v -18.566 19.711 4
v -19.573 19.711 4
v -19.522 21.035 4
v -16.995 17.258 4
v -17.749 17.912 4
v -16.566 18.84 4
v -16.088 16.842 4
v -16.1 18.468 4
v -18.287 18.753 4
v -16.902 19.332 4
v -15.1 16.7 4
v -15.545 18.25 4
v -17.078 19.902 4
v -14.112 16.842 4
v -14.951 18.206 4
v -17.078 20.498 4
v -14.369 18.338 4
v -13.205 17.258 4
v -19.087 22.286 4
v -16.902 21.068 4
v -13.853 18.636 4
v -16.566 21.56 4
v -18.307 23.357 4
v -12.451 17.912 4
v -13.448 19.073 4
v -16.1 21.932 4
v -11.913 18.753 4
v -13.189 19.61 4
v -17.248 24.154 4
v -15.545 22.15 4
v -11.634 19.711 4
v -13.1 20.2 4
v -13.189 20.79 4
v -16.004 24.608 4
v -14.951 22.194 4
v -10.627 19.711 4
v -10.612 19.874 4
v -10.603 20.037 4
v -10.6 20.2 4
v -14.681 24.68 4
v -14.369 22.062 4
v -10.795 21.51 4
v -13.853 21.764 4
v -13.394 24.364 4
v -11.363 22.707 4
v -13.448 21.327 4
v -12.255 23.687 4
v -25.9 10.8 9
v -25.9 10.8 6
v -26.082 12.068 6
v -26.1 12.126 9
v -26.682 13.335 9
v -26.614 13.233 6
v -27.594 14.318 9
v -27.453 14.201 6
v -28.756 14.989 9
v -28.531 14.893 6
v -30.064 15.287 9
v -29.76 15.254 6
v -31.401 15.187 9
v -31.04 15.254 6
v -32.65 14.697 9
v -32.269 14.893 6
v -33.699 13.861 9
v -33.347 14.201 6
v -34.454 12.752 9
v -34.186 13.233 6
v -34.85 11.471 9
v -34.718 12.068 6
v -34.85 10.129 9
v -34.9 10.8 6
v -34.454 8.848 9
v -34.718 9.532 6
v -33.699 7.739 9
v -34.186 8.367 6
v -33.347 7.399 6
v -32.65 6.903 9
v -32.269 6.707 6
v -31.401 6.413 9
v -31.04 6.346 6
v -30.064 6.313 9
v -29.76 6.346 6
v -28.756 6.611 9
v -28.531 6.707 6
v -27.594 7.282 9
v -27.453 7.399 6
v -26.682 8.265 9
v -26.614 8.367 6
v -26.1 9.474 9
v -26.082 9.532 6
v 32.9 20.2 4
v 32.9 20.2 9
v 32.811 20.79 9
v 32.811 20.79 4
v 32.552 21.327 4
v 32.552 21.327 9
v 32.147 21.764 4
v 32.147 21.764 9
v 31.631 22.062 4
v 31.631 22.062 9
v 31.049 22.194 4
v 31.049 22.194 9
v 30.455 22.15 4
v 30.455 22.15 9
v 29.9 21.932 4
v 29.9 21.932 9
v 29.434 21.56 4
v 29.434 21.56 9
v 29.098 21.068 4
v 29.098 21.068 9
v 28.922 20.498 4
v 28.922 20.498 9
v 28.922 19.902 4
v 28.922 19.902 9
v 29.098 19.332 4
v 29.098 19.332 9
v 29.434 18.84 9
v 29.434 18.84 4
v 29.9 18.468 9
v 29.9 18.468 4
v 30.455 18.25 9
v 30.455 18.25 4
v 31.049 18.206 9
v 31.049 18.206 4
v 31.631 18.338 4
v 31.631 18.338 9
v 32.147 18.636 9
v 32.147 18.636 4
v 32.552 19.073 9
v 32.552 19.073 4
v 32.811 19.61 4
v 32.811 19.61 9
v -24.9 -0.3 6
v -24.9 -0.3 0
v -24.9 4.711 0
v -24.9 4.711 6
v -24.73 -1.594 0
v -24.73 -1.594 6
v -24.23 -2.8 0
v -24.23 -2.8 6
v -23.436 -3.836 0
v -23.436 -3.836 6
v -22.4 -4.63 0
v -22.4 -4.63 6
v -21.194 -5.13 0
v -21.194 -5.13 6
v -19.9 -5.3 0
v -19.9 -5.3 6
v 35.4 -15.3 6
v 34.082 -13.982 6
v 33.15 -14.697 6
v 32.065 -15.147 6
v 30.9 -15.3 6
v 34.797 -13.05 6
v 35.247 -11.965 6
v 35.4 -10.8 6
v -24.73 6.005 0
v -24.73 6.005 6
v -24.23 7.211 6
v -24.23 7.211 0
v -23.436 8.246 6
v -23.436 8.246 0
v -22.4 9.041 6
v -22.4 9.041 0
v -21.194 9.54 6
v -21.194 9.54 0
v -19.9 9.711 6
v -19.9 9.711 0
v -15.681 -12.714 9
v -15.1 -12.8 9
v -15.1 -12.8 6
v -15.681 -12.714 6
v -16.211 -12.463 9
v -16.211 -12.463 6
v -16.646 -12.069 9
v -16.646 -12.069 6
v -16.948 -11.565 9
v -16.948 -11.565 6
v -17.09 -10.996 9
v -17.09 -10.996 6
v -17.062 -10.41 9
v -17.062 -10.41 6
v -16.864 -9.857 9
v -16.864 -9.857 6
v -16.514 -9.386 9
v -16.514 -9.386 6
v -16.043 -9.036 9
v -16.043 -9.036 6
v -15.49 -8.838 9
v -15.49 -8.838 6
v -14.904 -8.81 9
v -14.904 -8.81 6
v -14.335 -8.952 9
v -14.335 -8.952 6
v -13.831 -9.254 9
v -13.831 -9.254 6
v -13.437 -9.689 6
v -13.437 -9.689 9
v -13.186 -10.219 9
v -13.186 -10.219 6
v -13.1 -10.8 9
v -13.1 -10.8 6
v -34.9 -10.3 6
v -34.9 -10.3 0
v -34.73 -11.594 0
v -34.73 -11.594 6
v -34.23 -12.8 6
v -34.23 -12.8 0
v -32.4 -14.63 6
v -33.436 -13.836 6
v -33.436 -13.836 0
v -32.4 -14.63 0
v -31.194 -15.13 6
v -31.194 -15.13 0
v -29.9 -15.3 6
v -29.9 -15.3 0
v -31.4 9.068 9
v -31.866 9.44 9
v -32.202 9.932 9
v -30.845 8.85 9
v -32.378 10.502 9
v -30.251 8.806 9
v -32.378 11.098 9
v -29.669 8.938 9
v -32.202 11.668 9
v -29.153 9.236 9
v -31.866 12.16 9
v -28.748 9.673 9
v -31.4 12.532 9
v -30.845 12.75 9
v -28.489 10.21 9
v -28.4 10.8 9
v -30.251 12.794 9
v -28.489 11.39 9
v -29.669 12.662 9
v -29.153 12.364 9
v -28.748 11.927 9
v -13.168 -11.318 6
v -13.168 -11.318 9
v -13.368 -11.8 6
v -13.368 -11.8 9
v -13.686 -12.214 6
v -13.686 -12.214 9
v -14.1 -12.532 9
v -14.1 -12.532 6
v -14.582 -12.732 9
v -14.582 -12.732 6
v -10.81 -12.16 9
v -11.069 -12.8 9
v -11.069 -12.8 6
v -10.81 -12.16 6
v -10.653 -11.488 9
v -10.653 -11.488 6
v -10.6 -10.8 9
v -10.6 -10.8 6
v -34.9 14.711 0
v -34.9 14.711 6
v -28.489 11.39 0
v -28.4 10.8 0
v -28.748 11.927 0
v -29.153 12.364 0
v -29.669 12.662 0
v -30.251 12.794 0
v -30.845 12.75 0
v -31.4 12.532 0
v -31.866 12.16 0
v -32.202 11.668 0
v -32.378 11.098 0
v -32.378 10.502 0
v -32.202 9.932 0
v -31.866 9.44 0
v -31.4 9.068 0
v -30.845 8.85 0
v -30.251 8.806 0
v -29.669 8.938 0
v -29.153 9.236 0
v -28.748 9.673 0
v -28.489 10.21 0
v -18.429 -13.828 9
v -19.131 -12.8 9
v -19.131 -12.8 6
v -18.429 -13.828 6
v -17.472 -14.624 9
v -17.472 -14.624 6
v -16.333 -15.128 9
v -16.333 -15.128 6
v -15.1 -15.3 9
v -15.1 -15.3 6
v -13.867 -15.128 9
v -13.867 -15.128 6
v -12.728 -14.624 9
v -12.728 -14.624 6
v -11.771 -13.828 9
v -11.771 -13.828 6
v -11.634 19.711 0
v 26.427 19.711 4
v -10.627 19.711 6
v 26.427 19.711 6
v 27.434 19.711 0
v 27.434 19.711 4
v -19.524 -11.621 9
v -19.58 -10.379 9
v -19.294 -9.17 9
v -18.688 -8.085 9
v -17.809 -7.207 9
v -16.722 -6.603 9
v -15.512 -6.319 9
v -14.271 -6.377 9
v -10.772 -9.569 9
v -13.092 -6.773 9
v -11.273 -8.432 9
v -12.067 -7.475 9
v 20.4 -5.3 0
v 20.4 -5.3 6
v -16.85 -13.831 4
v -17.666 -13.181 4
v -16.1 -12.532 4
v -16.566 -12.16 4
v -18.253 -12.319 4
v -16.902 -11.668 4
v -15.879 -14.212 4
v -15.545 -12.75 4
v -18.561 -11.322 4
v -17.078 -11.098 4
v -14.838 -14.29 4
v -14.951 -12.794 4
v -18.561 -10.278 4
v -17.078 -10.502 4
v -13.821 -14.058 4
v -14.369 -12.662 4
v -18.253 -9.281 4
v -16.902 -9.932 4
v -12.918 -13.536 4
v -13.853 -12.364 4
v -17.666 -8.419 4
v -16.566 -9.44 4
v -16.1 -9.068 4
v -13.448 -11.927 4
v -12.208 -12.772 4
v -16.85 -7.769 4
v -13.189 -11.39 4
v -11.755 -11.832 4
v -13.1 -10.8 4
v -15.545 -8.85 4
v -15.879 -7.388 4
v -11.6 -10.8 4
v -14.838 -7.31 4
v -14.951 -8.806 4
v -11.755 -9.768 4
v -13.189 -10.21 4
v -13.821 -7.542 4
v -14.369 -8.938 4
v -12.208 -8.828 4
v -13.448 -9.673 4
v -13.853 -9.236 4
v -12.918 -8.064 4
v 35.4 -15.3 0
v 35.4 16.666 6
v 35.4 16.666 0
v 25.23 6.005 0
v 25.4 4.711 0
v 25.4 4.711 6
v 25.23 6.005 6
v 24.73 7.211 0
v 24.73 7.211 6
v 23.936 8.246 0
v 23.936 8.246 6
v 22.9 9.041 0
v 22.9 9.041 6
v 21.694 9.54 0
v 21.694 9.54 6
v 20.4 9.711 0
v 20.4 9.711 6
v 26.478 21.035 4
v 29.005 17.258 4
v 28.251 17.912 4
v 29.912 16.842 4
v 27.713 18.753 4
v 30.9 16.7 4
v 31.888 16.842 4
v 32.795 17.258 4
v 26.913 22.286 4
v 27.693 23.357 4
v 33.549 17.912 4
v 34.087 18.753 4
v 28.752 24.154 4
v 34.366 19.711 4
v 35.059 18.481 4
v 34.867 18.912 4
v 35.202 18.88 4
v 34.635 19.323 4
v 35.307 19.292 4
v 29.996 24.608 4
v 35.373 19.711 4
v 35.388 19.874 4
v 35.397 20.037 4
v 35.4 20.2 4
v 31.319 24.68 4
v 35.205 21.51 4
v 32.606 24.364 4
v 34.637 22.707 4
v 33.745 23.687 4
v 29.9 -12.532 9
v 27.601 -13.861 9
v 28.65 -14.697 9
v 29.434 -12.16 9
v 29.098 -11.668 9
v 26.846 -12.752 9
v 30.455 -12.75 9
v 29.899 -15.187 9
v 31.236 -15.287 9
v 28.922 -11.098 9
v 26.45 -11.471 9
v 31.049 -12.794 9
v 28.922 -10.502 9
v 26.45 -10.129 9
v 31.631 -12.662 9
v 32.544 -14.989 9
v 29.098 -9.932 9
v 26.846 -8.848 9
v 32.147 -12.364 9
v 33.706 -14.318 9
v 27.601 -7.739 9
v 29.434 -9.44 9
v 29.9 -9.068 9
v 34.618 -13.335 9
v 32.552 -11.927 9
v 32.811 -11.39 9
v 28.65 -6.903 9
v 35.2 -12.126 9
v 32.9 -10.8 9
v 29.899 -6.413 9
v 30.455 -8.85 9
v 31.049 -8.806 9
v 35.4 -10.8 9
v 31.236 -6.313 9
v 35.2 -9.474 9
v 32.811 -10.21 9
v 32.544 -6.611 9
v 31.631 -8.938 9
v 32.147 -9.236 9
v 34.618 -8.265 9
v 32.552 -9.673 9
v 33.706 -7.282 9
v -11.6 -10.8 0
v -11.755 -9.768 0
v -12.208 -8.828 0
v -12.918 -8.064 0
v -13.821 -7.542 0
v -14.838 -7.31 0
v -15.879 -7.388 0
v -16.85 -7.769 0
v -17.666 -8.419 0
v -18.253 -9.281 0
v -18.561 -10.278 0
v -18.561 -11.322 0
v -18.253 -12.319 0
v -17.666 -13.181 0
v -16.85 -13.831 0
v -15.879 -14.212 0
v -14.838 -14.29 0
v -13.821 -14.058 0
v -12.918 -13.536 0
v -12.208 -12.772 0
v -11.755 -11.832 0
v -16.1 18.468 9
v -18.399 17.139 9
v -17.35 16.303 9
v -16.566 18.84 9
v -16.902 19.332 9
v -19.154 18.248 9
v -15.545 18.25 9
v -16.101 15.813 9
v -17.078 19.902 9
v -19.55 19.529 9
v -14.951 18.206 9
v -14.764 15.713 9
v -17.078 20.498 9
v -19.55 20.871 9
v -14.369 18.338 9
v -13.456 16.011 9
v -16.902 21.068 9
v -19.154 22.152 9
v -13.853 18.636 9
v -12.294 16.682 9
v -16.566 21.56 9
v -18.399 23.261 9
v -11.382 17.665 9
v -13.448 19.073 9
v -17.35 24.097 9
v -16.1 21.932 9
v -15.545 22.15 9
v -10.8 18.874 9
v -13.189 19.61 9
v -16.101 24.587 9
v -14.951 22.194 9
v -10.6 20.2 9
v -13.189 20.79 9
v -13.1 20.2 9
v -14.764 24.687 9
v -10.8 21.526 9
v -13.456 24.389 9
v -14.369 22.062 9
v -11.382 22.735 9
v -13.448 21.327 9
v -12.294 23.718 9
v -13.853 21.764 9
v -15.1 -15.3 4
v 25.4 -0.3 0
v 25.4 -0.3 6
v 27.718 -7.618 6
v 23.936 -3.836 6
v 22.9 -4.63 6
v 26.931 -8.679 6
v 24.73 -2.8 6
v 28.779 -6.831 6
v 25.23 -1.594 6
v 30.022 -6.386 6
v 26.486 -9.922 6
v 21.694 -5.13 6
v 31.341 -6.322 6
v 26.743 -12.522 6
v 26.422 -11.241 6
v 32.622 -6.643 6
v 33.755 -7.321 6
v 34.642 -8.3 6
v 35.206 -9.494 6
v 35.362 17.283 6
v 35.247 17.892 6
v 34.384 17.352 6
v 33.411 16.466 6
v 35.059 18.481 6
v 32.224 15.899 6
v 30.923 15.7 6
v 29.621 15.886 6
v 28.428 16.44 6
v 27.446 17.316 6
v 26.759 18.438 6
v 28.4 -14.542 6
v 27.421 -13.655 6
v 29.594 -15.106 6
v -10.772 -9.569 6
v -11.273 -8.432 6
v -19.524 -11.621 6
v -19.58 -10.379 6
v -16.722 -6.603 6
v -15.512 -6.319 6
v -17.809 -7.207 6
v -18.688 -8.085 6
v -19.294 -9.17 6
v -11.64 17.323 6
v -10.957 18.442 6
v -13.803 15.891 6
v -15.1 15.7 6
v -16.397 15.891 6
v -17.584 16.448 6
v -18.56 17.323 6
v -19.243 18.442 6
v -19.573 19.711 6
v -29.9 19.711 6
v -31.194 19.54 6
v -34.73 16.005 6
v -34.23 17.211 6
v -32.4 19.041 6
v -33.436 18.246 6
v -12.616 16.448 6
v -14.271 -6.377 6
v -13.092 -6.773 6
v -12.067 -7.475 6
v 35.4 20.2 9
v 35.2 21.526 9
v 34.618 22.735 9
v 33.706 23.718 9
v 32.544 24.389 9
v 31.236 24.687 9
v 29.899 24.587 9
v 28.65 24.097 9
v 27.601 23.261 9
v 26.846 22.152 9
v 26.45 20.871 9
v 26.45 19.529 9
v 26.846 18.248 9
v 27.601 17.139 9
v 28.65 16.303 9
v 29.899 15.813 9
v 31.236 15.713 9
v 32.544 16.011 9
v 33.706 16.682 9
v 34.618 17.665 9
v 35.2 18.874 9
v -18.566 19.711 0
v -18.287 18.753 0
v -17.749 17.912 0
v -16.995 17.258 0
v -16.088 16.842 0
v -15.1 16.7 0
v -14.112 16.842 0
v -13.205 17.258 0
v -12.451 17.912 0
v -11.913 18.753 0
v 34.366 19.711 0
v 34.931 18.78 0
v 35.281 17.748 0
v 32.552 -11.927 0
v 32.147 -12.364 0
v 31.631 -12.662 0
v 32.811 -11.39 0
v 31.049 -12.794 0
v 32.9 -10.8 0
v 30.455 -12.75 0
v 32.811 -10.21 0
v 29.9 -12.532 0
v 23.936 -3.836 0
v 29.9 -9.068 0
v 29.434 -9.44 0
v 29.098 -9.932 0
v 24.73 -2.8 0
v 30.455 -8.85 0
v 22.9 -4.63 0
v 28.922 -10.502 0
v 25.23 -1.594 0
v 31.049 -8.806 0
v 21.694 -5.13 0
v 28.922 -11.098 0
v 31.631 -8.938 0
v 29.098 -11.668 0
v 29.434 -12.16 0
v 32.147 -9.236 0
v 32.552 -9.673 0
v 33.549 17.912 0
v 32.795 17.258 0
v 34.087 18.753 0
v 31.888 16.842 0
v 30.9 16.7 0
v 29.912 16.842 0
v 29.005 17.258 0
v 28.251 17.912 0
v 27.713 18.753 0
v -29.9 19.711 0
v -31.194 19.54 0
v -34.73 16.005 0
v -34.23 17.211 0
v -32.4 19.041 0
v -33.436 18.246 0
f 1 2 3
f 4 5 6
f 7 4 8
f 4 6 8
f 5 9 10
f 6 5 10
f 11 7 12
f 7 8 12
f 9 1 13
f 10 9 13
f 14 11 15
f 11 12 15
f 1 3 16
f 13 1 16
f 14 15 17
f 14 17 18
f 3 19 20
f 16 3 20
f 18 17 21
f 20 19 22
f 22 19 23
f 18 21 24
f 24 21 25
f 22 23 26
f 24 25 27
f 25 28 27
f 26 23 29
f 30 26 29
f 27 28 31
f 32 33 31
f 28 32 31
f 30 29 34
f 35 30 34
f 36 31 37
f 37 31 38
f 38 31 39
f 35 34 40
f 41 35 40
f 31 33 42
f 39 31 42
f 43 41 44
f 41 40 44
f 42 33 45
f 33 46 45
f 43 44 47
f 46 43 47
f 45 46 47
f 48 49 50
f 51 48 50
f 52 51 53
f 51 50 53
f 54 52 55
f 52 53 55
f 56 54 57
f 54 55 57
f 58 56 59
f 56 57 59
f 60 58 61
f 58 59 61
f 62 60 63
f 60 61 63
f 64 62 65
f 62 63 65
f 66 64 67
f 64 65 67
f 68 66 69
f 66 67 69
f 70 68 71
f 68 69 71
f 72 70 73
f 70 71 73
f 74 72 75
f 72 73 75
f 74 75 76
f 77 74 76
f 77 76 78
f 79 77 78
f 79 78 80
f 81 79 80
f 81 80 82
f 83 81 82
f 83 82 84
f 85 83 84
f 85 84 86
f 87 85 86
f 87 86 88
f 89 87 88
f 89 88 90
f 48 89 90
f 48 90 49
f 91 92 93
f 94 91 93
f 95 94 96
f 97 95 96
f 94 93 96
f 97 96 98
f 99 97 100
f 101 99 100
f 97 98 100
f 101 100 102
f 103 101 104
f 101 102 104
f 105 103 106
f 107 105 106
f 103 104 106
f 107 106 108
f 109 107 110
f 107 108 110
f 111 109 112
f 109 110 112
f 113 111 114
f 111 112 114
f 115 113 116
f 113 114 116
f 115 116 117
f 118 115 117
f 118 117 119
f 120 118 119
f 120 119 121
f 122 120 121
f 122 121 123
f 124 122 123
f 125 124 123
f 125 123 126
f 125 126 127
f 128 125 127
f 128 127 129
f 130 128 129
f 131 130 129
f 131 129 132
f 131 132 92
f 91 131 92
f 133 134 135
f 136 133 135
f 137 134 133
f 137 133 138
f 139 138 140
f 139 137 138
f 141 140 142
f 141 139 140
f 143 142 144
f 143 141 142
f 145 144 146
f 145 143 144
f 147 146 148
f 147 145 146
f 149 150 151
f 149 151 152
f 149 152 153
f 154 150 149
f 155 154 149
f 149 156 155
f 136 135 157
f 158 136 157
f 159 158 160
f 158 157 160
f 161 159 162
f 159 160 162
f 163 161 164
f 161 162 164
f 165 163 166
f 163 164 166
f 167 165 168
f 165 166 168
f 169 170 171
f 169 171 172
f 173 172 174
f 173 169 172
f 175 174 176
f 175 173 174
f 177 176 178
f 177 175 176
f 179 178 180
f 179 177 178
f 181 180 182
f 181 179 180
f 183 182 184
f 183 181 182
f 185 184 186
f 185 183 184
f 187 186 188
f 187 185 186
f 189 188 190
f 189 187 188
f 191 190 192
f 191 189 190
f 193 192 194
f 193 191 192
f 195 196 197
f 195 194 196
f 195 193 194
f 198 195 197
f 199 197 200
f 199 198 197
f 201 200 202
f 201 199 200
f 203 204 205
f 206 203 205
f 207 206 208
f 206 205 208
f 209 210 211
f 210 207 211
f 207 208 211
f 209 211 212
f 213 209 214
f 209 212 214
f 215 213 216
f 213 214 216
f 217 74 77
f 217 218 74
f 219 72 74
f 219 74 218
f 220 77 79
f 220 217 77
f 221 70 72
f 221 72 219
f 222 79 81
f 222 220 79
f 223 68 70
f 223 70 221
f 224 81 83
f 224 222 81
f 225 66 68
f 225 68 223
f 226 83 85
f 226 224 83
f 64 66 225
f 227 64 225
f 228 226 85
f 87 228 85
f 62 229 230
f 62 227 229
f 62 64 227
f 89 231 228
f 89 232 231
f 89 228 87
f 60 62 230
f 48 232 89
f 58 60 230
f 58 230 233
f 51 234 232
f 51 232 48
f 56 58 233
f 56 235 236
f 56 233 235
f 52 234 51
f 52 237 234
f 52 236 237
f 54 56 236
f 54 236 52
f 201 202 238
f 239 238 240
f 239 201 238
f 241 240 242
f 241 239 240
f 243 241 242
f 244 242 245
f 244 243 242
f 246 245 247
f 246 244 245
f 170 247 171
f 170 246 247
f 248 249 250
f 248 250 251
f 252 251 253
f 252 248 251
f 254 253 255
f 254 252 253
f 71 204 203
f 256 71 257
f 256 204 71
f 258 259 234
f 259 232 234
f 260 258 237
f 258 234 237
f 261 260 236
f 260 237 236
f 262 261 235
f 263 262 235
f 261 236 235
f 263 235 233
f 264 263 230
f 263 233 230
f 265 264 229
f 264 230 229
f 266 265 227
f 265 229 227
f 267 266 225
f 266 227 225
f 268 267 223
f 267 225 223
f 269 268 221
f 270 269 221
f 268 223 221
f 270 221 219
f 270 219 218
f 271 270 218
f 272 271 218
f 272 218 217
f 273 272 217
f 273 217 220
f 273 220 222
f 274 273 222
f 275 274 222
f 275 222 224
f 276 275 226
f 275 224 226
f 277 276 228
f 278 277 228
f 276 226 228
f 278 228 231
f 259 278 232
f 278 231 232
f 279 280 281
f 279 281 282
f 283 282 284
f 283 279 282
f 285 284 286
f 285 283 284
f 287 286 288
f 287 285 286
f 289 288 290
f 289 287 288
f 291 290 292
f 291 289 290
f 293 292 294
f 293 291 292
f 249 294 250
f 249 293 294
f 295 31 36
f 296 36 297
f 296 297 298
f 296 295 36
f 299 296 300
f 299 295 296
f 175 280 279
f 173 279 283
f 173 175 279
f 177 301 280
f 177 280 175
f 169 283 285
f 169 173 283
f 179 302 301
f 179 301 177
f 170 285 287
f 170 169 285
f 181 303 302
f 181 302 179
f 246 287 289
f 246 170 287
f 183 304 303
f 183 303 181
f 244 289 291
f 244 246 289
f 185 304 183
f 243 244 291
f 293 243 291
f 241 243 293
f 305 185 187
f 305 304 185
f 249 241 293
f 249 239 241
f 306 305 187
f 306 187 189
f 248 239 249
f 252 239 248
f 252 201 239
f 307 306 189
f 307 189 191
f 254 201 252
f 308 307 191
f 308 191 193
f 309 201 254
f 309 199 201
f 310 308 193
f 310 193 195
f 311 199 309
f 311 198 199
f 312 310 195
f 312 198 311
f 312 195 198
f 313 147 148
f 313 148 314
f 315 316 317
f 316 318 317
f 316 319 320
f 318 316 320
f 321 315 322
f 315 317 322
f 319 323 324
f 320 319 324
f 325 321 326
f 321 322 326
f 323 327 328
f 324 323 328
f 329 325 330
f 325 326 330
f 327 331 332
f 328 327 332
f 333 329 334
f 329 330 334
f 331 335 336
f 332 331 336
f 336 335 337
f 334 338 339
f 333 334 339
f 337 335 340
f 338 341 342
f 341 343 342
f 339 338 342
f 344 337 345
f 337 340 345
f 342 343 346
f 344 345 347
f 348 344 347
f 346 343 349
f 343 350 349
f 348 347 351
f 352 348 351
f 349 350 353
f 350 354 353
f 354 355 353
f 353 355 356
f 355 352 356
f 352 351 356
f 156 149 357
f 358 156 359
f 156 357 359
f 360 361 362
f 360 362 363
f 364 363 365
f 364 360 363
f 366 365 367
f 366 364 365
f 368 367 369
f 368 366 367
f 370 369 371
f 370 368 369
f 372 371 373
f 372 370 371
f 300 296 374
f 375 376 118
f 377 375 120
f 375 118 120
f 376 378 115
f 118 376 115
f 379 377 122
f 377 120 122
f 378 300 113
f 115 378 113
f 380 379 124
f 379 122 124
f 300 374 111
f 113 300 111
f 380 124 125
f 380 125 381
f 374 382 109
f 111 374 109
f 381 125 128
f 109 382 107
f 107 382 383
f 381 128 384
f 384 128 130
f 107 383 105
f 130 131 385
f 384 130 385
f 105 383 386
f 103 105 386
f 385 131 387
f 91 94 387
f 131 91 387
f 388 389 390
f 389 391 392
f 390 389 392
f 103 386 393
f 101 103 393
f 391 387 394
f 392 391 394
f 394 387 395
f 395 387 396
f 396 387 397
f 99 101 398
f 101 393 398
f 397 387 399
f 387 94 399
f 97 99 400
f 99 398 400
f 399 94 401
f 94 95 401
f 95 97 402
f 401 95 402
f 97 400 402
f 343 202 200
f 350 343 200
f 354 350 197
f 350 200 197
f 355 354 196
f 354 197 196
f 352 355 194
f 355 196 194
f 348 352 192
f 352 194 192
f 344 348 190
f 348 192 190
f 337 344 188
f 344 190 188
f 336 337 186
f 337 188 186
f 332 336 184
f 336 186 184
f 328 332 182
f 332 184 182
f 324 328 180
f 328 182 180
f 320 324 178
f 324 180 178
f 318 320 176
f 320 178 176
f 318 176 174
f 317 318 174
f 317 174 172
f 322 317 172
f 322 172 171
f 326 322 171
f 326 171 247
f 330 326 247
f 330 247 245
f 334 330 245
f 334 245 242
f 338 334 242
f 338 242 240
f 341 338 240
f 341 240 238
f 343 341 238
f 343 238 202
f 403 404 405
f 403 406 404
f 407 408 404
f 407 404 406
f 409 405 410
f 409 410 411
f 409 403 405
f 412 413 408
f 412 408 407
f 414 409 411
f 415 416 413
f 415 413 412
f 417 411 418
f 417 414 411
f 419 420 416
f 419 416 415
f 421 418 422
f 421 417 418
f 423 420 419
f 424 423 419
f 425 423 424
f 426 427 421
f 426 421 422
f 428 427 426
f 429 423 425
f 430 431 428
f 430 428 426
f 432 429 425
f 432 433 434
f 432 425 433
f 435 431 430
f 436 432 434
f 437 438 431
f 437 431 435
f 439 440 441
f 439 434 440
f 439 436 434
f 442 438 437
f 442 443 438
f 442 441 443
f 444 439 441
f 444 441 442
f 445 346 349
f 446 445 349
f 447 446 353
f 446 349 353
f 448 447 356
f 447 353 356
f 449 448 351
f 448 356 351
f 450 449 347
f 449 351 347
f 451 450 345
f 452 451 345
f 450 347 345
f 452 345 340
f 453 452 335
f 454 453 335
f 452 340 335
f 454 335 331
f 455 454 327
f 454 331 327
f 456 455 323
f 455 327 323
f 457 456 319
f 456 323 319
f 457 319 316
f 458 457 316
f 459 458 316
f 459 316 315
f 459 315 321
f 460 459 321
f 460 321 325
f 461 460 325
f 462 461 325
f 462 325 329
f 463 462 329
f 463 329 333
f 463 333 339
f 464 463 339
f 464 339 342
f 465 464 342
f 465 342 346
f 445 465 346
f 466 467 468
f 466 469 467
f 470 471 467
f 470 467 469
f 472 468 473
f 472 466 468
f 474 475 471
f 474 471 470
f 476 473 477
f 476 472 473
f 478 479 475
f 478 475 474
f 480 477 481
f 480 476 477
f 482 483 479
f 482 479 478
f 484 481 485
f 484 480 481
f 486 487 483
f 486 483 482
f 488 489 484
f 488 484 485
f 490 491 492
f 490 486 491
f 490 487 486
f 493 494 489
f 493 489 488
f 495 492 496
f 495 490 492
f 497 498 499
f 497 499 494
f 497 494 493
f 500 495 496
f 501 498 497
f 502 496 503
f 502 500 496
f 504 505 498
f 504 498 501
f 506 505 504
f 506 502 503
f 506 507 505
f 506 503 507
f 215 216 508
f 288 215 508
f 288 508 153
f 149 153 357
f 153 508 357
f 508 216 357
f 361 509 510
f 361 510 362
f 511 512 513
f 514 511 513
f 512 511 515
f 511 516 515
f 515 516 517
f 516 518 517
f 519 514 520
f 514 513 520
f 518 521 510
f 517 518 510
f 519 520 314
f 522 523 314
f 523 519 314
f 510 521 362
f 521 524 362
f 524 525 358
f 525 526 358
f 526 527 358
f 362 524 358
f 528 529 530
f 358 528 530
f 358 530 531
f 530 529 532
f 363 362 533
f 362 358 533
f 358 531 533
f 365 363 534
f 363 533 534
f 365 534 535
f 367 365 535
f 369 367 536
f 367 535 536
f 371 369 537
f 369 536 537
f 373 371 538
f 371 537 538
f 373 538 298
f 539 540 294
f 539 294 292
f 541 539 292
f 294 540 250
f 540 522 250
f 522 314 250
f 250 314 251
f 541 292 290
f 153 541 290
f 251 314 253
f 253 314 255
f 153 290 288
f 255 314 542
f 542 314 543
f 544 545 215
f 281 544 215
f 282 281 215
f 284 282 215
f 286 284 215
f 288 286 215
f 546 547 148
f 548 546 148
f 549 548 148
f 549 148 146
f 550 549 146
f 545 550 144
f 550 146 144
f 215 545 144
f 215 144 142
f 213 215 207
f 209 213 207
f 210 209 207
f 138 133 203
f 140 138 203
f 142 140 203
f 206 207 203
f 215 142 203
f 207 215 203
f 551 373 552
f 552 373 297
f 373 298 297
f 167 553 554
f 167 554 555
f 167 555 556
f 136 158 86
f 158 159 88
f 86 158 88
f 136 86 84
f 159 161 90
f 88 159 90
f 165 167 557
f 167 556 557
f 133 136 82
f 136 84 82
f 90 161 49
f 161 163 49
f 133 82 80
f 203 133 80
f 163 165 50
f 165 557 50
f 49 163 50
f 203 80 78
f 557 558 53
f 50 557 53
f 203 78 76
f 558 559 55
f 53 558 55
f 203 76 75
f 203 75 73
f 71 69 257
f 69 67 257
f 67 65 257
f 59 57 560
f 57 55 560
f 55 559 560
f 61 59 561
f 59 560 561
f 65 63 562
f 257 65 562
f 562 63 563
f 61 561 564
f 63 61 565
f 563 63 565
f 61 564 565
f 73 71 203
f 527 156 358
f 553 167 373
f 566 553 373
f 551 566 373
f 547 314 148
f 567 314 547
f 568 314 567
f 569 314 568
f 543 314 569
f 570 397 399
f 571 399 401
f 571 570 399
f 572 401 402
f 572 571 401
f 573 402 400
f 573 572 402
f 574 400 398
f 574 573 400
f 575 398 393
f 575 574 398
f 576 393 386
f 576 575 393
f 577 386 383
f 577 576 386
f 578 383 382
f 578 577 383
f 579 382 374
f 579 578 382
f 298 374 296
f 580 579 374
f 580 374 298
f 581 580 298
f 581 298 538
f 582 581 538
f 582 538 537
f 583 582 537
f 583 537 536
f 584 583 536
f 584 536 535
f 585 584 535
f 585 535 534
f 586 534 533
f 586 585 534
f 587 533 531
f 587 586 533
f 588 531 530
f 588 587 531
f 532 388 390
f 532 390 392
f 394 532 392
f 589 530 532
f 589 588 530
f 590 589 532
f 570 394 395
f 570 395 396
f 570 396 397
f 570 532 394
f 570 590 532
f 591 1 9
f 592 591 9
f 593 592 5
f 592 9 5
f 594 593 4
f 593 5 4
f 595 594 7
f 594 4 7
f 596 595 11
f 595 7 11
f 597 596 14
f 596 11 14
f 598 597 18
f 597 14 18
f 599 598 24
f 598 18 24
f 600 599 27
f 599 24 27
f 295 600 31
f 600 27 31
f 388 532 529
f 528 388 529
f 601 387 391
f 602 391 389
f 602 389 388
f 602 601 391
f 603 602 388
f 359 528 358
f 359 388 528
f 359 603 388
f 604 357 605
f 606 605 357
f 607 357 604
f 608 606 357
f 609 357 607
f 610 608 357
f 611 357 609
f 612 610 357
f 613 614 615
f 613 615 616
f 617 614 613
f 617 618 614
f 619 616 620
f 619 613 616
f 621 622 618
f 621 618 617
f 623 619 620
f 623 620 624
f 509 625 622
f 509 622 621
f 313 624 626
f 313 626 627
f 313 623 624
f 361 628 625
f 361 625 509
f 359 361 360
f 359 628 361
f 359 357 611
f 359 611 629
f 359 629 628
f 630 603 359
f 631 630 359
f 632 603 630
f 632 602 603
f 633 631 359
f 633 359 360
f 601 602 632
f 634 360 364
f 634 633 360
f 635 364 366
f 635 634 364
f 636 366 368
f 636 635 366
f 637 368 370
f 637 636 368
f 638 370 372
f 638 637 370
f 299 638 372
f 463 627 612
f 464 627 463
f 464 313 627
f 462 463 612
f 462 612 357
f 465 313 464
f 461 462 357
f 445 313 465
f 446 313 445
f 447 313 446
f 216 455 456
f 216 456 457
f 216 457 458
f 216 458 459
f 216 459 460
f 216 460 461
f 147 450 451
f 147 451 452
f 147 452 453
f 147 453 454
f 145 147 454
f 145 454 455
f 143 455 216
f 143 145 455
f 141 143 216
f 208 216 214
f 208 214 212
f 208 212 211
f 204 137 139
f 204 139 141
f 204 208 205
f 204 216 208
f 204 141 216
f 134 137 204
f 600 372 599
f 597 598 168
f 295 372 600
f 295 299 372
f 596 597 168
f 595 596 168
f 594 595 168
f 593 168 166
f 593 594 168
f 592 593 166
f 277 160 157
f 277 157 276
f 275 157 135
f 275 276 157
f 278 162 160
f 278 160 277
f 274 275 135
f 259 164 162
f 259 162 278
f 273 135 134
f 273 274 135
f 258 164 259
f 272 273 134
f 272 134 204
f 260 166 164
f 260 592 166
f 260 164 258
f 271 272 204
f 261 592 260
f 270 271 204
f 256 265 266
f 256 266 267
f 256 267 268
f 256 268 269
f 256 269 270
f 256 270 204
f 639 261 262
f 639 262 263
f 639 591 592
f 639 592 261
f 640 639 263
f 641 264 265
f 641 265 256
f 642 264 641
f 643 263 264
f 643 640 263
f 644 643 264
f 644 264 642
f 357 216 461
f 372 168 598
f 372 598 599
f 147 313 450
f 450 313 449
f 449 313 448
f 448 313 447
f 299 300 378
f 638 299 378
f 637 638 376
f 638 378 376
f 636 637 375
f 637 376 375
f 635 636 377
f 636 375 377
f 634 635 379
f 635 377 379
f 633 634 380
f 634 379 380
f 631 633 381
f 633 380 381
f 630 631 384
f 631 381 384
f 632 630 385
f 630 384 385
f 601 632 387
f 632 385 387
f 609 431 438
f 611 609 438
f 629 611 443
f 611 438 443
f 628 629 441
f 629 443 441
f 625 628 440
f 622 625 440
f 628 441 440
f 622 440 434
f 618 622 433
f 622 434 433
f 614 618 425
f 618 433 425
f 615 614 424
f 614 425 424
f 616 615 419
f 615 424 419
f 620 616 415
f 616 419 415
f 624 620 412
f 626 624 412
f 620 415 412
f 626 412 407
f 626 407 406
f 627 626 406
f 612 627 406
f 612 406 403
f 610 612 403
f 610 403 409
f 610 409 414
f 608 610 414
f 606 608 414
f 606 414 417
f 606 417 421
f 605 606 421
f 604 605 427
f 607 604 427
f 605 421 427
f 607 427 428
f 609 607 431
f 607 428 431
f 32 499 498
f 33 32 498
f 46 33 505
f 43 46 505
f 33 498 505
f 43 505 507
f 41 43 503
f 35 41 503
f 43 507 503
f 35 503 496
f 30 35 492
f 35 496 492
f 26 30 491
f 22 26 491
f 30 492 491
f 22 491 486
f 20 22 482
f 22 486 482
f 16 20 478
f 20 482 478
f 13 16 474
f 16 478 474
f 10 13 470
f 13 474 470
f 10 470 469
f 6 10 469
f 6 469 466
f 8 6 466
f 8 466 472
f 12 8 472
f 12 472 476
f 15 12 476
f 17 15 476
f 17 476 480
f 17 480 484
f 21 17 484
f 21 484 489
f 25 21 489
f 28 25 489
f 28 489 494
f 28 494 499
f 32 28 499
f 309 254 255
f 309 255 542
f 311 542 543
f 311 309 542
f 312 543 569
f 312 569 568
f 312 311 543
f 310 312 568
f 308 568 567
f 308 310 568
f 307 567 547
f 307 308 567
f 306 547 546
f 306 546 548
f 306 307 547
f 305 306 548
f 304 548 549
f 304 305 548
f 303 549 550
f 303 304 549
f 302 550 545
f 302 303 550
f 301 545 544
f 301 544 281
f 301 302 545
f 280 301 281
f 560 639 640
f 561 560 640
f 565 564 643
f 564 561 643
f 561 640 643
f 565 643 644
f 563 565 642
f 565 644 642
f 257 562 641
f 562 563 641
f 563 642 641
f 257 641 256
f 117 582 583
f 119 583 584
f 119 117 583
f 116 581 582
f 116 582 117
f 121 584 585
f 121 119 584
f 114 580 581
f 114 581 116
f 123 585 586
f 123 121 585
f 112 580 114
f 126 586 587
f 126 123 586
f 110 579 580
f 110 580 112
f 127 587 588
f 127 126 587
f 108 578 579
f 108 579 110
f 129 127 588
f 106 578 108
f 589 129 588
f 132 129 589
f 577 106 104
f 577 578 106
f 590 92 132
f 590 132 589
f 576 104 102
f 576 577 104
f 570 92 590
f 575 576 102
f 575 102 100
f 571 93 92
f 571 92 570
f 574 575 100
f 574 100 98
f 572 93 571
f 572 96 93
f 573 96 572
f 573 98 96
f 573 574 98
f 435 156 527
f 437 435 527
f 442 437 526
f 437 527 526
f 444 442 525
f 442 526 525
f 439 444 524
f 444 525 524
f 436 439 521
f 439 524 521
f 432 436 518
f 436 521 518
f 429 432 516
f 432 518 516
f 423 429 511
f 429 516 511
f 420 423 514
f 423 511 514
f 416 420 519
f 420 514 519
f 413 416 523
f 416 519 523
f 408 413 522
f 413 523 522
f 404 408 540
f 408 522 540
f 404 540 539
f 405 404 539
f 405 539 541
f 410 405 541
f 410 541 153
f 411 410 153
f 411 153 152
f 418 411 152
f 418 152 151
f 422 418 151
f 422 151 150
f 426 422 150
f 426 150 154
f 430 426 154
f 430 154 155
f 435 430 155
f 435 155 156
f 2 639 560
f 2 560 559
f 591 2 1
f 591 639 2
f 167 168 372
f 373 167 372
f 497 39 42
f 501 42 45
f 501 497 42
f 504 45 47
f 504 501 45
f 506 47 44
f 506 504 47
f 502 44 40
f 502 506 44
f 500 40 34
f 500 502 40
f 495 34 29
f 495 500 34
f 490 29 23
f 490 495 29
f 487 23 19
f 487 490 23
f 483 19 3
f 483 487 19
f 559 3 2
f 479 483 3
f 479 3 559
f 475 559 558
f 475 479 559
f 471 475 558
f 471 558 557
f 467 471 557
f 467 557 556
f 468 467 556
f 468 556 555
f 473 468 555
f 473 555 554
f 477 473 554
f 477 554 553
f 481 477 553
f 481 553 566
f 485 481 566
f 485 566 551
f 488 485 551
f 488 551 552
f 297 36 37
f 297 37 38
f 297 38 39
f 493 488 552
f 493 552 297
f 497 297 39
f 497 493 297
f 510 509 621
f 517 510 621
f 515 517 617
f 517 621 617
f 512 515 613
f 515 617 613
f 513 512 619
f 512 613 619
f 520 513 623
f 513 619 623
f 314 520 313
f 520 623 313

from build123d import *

# Parameters (mm, degrees)
F4_R          = 4.5
F4_R_2        = 2
F5_DEPTH      = 9
F6_W          = 70.3
F6_H          = 35.0108387947
F6_W_2        = 50.3
F6_H_2        = 15.0108387947
F7_DEPTH      = 6
F8_R          = 4.5
F8_R_2        = 2
F9_DEPTH      = 5
F10_R         = 2
F11_DEPTH     = 9.001
F13_START     = -5
F12_R         = 3.5
F12_R_2       = 2
F13_DEPTH     = 23
F14_R         = 2
F15_DEPTH     = 9.001
F16_T1_DEPTH  = 6
F16_T3_DEPTH  = 6
F16_T5_DEPTH  = 6
F16_T7_DEPTH  = 6
F16_T9_DEPTH  = 31
F16_T14_DEPTH = 21.2263176167
F16_T19_DEPTH = 21.2263176167
F16_S20_R     = 4.5
F16_T21_DEPTH = 12
F16_T22_DEPTH = 31


# Not quite as in the source:
# - a fillet or chamfer that OpenCascade refuses, or shapes differently, is made with other operations: its cross-section is extruded or revolved along the edge and cut away or added
# - after a boolean that leaves OpenCascade's solid faulty, fix() repairs it


with BuildPart() as f5:
    # F4 (on Top) → F5 (new body)
    with BuildSketch(Plane.XY):
        with Locations((-30.4, 10.8)):
            Circle(F4_R)
        with Locations((-30.4, 10.8)):
            Circle(F4_R_2, mode=Mode.SUBTRACT)
    extrude(amount=F5_DEPTH)



with BuildPart() as f5b:
    # F4 (on Top) → F5, piece 2 (new body)
    with BuildSketch(Plane.XY):
        with Locations((30.9, -10.8)):
            Circle(F4_R)
        with Locations((30.9, -10.8)):
            Circle(F4_R_2, mode=Mode.SUBTRACT)
    extrude(amount=F5_DEPTH)


with BuildPart() as f5_1:
    add(f5.part)

    add(f5b.part)  # F7 merges F5b
    # F6 (on face) → F7 (join)
    with BuildSketch(Plane.XY):
        with Locations((0.25, 2.2054193974)):
            Rectangle(F6_W, F6_H)
        with Locations((0.25, 2.2054193974)):
            Rectangle(F6_W_2, F6_H_2, mode=Mode.SUBTRACT)
    extrude(amount=F7_DEPTH)

    # F8 (on face) → F9 (join)
    with BuildSketch(Plane.XY.offset(9)):
        with BuildLine():
            Line((-19.1311288741, -12.8), (-15.1, -12.8))
            Line((-15.1, -12.8), (-11.0688711259, -12.8))
            ThreePointArc((-11.0688711259, -12.8), (-10.7187855603, -11.8271124735), (-10.6, -10.8))
            ThreePointArc((-10.6, -10.8), (-16.1271124735, -6.4187855603), (-19.1311288741, -12.8))
        make_face()
        with BuildLine():
            ThreePointArc((-15.1, -12.8), (-16.5142135624, -9.3857864376), (-13.1, -10.8))
            ThreePointArc((-13.1, -10.8), (-13.6857864376, -12.2142135624), (-15.1, -12.8))
        make_face(mode=Mode.SUBTRACT)
        with BuildLine():
            Line((-11.0688711259, -12.8), (-15.1, -12.8))
            Line((-15.1, -12.8), (-19.1311288741, -12.8))
            ThreePointArc((-19.1311288741, -12.8), (-15.1, -15.3), (-11.0688711259, -12.8))
        make_face()
        with Locations((-15.1, 20.2)):
            Circle(F8_R)
        with Locations((-15.1, 20.2)):
            Circle(F8_R_2, mode=Mode.SUBTRACT)
        with Locations((30.9, 20.2)):
            Circle(F8_R)
        with Locations((30.9, 20.2)):
            Circle(F8_R_2, mode=Mode.SUBTRACT)
    extrude(amount=-F9_DEPTH)

    # F10 (on face) → F11 (cut, through all)
    with BuildSketch(Plane.XY.offset(9)):
        with Locations((30.9, -10.8)):
            Circle(F10_R)
        with Locations((-30.4, 10.8)):
            Circle(F10_R)
    extrude(amount=-F11_DEPTH, mode=Mode.SUBTRACT)

    # F12 (on face) → F13 (cut)
    with BuildSketch(Plane.XY.offset(9).offset(F13_START)):
        with Locations((-15.1, 20.2)):
            Circle(F12_R)
        with Locations((-15.1, 20.2)):
            Circle(F12_R_2, mode=Mode.SUBTRACT)
        with Locations((30.9, 20.2)):
            Circle(F12_R)
        with Locations((30.9, 20.2)):
            Circle(F12_R_2, mode=Mode.SUBTRACT)
        with Locations((-15.1, -10.8)):
            Circle(F12_R)
        with Locations((-15.1, -10.8)):
            Circle(F12_R_2, mode=Mode.SUBTRACT)
    extrude(amount=-F13_DEPTH, mode=Mode.SUBTRACT)

    # F14 (on face) → F15 (cut, through all)
    with BuildSketch(Plane.XY.offset(9)):
        with Locations((-15.1, 20.2)):
            Circle(F14_R)
        with Locations((30.9, 20.2)):
            Circle(F14_R)
        with Locations((-15.1, -10.8)):
            Circle(F14_R)
        with Locations((30.9, -10.8)):
            Circle(F14_R)
    extrude(amount=-F15_DEPTH, mode=Mode.SUBTRACT)

    add(f5_1.part.fix(), mode=Mode.REPLACE)

    # F16: fillet of radius 5 on 7 edges, made by hand

    # F16_s2 → F16_t1 (join)
    with BuildSketch(Plane.XY):
        with BuildLine():
            ThreePointArc((-24.9, -0.3), (-23.4355339059, -3.8355339059), (-19.9, -5.3))
            Line((-19.9, -5.3), (-24.9, -5.3))
            Line((-24.9, -5.3), (-24.9, -0.3))
        make_face()
    extrude(amount=F16_T1_DEPTH)

    # F16_s4 → F16_t3 (join)
    with BuildSketch(Plane.XY):
        with BuildLine():
            ThreePointArc((-24.9, 4.7108387947), (-23.4355339059, 8.2463727006), (-19.9, 9.7108387947))
            Line((-19.9, 9.7108387947), (-24.9, 9.7108387947))
            Line((-24.9, 9.7108387947), (-24.9, 4.7108387947))
        make_face()
    extrude(amount=F16_T3_DEPTH)

    # F16_s6 → F16_t5 (join)
    with BuildSketch(Plane.XY):
        with BuildLine():
            ThreePointArc((25.4, -0.3), (23.9355339059, -3.8355339059), (20.4, -5.3))
            Line((20.4, -5.3), (25.4, -5.3))
            Line((25.4, -5.3), (25.4, -0.3))
        make_face()
    extrude(amount=F16_T5_DEPTH)

    # F16_s8 → F16_t7 (join)
    with BuildSketch(Plane.XY):
        with BuildLine():
            ThreePointArc((25.4, 4.7108387947), (23.9355339059, 8.2463727006), (20.4, 9.7108387947))
            Line((20.4, 9.7108387947), (25.4, 9.7108387947))
            Line((25.4, 9.7108387947), (25.4, 4.7108387947))
        make_face()
    extrude(amount=F16_T7_DEPTH)

    # F16_s10 → F16_t9 (cut)
    with BuildSketch(Plane.XY.offset(-12.5)):
        with BuildLine():
            ThreePointArc((-34.9, -10.3), (-33.4355339059, -13.8355339059), (-29.9, -15.3))
            Line((-29.9, -15.3), (-34.9, -15.3))
            Line((-34.9, -15.3), (-34.9, -10.3))
        make_face()
    extrude(amount=F16_T9_DEPTH, mode=Mode.SUBTRACT)


with BuildPart() as f16_tool12:
    # F16_s13 → F16_t14 (new body)
    with BuildSketch(Plane.XY.offset(-7.6131588083)):
        with BuildLine():
            ThreePointArc((34.3656487582, 19.7108387947), (35.1343554889, 18.2736418448), (35.4, 16.6655752714))
            Line((35.4, 16.6655752714), (35.4, 19.7108387947))
            Line((35.4, 19.7108387947), (34.3656487582, 19.7108387947))
        make_face()
    extrude(amount=F16_T14_DEPTH)

    split(bisect_by=Plane.XY.offset(4), keep=Keep.BOTTOM)


with BuildPart() as f5_2:
    add(f5_1.part)

    # F16_t11: cut F16_tool12
    add(f16_tool12.part, mode=Mode.SUBTRACT)


with BuildPart() as f16_tool17:
    # F16_s18 → F16_t19 (new body)
    with BuildSketch(Plane.XY.offset(-7.6131588083)):
        with BuildLine():
            ThreePointArc((34.3656487582, 19.7108387947), (35.1343554889, 18.2736418448), (35.4, 16.6655752714))
            Line((35.4, 16.6655752714), (35.4, 19.7108387947))
            Line((35.4, 19.7108387947), (34.3656487582, 19.7108387947))
        make_face()
    extrude(amount=F16_T19_DEPTH)

    # F16_s20 → F16_t21 (cut, symmetric)
    with BuildSketch(Plane.XY.offset(3)):
        with Locations((30.9, 20.2)):
            Circle(F16_S20_R)
    extrude(amount=F16_T21_DEPTH, both=True, mode=Mode.SUBTRACT)


with BuildPart() as f5_3:
    add(f5_2.part)

    # F16_t16: cut F16_tool17
    add(f16_tool17.part, mode=Mode.SUBTRACT)

    # F16_s23 → F16_t22 (cut)
    with BuildSketch(Plane.XY.offset(-12.5)):
        with BuildLine():
            ThreePointArc((-29.9, 19.7108387947), (-33.4355339059, 18.2463727006), (-34.9, 14.7108387947))
            Line((-34.9, 14.7108387947), (-34.9, 19.7108387947))
            Line((-34.9, 19.7108387947), (-29.9, 19.7108387947))
        make_face()
    extrude(amount=F16_T22_DEPTH, mode=Mode.SUBTRACT)


solid = f5_3.part
